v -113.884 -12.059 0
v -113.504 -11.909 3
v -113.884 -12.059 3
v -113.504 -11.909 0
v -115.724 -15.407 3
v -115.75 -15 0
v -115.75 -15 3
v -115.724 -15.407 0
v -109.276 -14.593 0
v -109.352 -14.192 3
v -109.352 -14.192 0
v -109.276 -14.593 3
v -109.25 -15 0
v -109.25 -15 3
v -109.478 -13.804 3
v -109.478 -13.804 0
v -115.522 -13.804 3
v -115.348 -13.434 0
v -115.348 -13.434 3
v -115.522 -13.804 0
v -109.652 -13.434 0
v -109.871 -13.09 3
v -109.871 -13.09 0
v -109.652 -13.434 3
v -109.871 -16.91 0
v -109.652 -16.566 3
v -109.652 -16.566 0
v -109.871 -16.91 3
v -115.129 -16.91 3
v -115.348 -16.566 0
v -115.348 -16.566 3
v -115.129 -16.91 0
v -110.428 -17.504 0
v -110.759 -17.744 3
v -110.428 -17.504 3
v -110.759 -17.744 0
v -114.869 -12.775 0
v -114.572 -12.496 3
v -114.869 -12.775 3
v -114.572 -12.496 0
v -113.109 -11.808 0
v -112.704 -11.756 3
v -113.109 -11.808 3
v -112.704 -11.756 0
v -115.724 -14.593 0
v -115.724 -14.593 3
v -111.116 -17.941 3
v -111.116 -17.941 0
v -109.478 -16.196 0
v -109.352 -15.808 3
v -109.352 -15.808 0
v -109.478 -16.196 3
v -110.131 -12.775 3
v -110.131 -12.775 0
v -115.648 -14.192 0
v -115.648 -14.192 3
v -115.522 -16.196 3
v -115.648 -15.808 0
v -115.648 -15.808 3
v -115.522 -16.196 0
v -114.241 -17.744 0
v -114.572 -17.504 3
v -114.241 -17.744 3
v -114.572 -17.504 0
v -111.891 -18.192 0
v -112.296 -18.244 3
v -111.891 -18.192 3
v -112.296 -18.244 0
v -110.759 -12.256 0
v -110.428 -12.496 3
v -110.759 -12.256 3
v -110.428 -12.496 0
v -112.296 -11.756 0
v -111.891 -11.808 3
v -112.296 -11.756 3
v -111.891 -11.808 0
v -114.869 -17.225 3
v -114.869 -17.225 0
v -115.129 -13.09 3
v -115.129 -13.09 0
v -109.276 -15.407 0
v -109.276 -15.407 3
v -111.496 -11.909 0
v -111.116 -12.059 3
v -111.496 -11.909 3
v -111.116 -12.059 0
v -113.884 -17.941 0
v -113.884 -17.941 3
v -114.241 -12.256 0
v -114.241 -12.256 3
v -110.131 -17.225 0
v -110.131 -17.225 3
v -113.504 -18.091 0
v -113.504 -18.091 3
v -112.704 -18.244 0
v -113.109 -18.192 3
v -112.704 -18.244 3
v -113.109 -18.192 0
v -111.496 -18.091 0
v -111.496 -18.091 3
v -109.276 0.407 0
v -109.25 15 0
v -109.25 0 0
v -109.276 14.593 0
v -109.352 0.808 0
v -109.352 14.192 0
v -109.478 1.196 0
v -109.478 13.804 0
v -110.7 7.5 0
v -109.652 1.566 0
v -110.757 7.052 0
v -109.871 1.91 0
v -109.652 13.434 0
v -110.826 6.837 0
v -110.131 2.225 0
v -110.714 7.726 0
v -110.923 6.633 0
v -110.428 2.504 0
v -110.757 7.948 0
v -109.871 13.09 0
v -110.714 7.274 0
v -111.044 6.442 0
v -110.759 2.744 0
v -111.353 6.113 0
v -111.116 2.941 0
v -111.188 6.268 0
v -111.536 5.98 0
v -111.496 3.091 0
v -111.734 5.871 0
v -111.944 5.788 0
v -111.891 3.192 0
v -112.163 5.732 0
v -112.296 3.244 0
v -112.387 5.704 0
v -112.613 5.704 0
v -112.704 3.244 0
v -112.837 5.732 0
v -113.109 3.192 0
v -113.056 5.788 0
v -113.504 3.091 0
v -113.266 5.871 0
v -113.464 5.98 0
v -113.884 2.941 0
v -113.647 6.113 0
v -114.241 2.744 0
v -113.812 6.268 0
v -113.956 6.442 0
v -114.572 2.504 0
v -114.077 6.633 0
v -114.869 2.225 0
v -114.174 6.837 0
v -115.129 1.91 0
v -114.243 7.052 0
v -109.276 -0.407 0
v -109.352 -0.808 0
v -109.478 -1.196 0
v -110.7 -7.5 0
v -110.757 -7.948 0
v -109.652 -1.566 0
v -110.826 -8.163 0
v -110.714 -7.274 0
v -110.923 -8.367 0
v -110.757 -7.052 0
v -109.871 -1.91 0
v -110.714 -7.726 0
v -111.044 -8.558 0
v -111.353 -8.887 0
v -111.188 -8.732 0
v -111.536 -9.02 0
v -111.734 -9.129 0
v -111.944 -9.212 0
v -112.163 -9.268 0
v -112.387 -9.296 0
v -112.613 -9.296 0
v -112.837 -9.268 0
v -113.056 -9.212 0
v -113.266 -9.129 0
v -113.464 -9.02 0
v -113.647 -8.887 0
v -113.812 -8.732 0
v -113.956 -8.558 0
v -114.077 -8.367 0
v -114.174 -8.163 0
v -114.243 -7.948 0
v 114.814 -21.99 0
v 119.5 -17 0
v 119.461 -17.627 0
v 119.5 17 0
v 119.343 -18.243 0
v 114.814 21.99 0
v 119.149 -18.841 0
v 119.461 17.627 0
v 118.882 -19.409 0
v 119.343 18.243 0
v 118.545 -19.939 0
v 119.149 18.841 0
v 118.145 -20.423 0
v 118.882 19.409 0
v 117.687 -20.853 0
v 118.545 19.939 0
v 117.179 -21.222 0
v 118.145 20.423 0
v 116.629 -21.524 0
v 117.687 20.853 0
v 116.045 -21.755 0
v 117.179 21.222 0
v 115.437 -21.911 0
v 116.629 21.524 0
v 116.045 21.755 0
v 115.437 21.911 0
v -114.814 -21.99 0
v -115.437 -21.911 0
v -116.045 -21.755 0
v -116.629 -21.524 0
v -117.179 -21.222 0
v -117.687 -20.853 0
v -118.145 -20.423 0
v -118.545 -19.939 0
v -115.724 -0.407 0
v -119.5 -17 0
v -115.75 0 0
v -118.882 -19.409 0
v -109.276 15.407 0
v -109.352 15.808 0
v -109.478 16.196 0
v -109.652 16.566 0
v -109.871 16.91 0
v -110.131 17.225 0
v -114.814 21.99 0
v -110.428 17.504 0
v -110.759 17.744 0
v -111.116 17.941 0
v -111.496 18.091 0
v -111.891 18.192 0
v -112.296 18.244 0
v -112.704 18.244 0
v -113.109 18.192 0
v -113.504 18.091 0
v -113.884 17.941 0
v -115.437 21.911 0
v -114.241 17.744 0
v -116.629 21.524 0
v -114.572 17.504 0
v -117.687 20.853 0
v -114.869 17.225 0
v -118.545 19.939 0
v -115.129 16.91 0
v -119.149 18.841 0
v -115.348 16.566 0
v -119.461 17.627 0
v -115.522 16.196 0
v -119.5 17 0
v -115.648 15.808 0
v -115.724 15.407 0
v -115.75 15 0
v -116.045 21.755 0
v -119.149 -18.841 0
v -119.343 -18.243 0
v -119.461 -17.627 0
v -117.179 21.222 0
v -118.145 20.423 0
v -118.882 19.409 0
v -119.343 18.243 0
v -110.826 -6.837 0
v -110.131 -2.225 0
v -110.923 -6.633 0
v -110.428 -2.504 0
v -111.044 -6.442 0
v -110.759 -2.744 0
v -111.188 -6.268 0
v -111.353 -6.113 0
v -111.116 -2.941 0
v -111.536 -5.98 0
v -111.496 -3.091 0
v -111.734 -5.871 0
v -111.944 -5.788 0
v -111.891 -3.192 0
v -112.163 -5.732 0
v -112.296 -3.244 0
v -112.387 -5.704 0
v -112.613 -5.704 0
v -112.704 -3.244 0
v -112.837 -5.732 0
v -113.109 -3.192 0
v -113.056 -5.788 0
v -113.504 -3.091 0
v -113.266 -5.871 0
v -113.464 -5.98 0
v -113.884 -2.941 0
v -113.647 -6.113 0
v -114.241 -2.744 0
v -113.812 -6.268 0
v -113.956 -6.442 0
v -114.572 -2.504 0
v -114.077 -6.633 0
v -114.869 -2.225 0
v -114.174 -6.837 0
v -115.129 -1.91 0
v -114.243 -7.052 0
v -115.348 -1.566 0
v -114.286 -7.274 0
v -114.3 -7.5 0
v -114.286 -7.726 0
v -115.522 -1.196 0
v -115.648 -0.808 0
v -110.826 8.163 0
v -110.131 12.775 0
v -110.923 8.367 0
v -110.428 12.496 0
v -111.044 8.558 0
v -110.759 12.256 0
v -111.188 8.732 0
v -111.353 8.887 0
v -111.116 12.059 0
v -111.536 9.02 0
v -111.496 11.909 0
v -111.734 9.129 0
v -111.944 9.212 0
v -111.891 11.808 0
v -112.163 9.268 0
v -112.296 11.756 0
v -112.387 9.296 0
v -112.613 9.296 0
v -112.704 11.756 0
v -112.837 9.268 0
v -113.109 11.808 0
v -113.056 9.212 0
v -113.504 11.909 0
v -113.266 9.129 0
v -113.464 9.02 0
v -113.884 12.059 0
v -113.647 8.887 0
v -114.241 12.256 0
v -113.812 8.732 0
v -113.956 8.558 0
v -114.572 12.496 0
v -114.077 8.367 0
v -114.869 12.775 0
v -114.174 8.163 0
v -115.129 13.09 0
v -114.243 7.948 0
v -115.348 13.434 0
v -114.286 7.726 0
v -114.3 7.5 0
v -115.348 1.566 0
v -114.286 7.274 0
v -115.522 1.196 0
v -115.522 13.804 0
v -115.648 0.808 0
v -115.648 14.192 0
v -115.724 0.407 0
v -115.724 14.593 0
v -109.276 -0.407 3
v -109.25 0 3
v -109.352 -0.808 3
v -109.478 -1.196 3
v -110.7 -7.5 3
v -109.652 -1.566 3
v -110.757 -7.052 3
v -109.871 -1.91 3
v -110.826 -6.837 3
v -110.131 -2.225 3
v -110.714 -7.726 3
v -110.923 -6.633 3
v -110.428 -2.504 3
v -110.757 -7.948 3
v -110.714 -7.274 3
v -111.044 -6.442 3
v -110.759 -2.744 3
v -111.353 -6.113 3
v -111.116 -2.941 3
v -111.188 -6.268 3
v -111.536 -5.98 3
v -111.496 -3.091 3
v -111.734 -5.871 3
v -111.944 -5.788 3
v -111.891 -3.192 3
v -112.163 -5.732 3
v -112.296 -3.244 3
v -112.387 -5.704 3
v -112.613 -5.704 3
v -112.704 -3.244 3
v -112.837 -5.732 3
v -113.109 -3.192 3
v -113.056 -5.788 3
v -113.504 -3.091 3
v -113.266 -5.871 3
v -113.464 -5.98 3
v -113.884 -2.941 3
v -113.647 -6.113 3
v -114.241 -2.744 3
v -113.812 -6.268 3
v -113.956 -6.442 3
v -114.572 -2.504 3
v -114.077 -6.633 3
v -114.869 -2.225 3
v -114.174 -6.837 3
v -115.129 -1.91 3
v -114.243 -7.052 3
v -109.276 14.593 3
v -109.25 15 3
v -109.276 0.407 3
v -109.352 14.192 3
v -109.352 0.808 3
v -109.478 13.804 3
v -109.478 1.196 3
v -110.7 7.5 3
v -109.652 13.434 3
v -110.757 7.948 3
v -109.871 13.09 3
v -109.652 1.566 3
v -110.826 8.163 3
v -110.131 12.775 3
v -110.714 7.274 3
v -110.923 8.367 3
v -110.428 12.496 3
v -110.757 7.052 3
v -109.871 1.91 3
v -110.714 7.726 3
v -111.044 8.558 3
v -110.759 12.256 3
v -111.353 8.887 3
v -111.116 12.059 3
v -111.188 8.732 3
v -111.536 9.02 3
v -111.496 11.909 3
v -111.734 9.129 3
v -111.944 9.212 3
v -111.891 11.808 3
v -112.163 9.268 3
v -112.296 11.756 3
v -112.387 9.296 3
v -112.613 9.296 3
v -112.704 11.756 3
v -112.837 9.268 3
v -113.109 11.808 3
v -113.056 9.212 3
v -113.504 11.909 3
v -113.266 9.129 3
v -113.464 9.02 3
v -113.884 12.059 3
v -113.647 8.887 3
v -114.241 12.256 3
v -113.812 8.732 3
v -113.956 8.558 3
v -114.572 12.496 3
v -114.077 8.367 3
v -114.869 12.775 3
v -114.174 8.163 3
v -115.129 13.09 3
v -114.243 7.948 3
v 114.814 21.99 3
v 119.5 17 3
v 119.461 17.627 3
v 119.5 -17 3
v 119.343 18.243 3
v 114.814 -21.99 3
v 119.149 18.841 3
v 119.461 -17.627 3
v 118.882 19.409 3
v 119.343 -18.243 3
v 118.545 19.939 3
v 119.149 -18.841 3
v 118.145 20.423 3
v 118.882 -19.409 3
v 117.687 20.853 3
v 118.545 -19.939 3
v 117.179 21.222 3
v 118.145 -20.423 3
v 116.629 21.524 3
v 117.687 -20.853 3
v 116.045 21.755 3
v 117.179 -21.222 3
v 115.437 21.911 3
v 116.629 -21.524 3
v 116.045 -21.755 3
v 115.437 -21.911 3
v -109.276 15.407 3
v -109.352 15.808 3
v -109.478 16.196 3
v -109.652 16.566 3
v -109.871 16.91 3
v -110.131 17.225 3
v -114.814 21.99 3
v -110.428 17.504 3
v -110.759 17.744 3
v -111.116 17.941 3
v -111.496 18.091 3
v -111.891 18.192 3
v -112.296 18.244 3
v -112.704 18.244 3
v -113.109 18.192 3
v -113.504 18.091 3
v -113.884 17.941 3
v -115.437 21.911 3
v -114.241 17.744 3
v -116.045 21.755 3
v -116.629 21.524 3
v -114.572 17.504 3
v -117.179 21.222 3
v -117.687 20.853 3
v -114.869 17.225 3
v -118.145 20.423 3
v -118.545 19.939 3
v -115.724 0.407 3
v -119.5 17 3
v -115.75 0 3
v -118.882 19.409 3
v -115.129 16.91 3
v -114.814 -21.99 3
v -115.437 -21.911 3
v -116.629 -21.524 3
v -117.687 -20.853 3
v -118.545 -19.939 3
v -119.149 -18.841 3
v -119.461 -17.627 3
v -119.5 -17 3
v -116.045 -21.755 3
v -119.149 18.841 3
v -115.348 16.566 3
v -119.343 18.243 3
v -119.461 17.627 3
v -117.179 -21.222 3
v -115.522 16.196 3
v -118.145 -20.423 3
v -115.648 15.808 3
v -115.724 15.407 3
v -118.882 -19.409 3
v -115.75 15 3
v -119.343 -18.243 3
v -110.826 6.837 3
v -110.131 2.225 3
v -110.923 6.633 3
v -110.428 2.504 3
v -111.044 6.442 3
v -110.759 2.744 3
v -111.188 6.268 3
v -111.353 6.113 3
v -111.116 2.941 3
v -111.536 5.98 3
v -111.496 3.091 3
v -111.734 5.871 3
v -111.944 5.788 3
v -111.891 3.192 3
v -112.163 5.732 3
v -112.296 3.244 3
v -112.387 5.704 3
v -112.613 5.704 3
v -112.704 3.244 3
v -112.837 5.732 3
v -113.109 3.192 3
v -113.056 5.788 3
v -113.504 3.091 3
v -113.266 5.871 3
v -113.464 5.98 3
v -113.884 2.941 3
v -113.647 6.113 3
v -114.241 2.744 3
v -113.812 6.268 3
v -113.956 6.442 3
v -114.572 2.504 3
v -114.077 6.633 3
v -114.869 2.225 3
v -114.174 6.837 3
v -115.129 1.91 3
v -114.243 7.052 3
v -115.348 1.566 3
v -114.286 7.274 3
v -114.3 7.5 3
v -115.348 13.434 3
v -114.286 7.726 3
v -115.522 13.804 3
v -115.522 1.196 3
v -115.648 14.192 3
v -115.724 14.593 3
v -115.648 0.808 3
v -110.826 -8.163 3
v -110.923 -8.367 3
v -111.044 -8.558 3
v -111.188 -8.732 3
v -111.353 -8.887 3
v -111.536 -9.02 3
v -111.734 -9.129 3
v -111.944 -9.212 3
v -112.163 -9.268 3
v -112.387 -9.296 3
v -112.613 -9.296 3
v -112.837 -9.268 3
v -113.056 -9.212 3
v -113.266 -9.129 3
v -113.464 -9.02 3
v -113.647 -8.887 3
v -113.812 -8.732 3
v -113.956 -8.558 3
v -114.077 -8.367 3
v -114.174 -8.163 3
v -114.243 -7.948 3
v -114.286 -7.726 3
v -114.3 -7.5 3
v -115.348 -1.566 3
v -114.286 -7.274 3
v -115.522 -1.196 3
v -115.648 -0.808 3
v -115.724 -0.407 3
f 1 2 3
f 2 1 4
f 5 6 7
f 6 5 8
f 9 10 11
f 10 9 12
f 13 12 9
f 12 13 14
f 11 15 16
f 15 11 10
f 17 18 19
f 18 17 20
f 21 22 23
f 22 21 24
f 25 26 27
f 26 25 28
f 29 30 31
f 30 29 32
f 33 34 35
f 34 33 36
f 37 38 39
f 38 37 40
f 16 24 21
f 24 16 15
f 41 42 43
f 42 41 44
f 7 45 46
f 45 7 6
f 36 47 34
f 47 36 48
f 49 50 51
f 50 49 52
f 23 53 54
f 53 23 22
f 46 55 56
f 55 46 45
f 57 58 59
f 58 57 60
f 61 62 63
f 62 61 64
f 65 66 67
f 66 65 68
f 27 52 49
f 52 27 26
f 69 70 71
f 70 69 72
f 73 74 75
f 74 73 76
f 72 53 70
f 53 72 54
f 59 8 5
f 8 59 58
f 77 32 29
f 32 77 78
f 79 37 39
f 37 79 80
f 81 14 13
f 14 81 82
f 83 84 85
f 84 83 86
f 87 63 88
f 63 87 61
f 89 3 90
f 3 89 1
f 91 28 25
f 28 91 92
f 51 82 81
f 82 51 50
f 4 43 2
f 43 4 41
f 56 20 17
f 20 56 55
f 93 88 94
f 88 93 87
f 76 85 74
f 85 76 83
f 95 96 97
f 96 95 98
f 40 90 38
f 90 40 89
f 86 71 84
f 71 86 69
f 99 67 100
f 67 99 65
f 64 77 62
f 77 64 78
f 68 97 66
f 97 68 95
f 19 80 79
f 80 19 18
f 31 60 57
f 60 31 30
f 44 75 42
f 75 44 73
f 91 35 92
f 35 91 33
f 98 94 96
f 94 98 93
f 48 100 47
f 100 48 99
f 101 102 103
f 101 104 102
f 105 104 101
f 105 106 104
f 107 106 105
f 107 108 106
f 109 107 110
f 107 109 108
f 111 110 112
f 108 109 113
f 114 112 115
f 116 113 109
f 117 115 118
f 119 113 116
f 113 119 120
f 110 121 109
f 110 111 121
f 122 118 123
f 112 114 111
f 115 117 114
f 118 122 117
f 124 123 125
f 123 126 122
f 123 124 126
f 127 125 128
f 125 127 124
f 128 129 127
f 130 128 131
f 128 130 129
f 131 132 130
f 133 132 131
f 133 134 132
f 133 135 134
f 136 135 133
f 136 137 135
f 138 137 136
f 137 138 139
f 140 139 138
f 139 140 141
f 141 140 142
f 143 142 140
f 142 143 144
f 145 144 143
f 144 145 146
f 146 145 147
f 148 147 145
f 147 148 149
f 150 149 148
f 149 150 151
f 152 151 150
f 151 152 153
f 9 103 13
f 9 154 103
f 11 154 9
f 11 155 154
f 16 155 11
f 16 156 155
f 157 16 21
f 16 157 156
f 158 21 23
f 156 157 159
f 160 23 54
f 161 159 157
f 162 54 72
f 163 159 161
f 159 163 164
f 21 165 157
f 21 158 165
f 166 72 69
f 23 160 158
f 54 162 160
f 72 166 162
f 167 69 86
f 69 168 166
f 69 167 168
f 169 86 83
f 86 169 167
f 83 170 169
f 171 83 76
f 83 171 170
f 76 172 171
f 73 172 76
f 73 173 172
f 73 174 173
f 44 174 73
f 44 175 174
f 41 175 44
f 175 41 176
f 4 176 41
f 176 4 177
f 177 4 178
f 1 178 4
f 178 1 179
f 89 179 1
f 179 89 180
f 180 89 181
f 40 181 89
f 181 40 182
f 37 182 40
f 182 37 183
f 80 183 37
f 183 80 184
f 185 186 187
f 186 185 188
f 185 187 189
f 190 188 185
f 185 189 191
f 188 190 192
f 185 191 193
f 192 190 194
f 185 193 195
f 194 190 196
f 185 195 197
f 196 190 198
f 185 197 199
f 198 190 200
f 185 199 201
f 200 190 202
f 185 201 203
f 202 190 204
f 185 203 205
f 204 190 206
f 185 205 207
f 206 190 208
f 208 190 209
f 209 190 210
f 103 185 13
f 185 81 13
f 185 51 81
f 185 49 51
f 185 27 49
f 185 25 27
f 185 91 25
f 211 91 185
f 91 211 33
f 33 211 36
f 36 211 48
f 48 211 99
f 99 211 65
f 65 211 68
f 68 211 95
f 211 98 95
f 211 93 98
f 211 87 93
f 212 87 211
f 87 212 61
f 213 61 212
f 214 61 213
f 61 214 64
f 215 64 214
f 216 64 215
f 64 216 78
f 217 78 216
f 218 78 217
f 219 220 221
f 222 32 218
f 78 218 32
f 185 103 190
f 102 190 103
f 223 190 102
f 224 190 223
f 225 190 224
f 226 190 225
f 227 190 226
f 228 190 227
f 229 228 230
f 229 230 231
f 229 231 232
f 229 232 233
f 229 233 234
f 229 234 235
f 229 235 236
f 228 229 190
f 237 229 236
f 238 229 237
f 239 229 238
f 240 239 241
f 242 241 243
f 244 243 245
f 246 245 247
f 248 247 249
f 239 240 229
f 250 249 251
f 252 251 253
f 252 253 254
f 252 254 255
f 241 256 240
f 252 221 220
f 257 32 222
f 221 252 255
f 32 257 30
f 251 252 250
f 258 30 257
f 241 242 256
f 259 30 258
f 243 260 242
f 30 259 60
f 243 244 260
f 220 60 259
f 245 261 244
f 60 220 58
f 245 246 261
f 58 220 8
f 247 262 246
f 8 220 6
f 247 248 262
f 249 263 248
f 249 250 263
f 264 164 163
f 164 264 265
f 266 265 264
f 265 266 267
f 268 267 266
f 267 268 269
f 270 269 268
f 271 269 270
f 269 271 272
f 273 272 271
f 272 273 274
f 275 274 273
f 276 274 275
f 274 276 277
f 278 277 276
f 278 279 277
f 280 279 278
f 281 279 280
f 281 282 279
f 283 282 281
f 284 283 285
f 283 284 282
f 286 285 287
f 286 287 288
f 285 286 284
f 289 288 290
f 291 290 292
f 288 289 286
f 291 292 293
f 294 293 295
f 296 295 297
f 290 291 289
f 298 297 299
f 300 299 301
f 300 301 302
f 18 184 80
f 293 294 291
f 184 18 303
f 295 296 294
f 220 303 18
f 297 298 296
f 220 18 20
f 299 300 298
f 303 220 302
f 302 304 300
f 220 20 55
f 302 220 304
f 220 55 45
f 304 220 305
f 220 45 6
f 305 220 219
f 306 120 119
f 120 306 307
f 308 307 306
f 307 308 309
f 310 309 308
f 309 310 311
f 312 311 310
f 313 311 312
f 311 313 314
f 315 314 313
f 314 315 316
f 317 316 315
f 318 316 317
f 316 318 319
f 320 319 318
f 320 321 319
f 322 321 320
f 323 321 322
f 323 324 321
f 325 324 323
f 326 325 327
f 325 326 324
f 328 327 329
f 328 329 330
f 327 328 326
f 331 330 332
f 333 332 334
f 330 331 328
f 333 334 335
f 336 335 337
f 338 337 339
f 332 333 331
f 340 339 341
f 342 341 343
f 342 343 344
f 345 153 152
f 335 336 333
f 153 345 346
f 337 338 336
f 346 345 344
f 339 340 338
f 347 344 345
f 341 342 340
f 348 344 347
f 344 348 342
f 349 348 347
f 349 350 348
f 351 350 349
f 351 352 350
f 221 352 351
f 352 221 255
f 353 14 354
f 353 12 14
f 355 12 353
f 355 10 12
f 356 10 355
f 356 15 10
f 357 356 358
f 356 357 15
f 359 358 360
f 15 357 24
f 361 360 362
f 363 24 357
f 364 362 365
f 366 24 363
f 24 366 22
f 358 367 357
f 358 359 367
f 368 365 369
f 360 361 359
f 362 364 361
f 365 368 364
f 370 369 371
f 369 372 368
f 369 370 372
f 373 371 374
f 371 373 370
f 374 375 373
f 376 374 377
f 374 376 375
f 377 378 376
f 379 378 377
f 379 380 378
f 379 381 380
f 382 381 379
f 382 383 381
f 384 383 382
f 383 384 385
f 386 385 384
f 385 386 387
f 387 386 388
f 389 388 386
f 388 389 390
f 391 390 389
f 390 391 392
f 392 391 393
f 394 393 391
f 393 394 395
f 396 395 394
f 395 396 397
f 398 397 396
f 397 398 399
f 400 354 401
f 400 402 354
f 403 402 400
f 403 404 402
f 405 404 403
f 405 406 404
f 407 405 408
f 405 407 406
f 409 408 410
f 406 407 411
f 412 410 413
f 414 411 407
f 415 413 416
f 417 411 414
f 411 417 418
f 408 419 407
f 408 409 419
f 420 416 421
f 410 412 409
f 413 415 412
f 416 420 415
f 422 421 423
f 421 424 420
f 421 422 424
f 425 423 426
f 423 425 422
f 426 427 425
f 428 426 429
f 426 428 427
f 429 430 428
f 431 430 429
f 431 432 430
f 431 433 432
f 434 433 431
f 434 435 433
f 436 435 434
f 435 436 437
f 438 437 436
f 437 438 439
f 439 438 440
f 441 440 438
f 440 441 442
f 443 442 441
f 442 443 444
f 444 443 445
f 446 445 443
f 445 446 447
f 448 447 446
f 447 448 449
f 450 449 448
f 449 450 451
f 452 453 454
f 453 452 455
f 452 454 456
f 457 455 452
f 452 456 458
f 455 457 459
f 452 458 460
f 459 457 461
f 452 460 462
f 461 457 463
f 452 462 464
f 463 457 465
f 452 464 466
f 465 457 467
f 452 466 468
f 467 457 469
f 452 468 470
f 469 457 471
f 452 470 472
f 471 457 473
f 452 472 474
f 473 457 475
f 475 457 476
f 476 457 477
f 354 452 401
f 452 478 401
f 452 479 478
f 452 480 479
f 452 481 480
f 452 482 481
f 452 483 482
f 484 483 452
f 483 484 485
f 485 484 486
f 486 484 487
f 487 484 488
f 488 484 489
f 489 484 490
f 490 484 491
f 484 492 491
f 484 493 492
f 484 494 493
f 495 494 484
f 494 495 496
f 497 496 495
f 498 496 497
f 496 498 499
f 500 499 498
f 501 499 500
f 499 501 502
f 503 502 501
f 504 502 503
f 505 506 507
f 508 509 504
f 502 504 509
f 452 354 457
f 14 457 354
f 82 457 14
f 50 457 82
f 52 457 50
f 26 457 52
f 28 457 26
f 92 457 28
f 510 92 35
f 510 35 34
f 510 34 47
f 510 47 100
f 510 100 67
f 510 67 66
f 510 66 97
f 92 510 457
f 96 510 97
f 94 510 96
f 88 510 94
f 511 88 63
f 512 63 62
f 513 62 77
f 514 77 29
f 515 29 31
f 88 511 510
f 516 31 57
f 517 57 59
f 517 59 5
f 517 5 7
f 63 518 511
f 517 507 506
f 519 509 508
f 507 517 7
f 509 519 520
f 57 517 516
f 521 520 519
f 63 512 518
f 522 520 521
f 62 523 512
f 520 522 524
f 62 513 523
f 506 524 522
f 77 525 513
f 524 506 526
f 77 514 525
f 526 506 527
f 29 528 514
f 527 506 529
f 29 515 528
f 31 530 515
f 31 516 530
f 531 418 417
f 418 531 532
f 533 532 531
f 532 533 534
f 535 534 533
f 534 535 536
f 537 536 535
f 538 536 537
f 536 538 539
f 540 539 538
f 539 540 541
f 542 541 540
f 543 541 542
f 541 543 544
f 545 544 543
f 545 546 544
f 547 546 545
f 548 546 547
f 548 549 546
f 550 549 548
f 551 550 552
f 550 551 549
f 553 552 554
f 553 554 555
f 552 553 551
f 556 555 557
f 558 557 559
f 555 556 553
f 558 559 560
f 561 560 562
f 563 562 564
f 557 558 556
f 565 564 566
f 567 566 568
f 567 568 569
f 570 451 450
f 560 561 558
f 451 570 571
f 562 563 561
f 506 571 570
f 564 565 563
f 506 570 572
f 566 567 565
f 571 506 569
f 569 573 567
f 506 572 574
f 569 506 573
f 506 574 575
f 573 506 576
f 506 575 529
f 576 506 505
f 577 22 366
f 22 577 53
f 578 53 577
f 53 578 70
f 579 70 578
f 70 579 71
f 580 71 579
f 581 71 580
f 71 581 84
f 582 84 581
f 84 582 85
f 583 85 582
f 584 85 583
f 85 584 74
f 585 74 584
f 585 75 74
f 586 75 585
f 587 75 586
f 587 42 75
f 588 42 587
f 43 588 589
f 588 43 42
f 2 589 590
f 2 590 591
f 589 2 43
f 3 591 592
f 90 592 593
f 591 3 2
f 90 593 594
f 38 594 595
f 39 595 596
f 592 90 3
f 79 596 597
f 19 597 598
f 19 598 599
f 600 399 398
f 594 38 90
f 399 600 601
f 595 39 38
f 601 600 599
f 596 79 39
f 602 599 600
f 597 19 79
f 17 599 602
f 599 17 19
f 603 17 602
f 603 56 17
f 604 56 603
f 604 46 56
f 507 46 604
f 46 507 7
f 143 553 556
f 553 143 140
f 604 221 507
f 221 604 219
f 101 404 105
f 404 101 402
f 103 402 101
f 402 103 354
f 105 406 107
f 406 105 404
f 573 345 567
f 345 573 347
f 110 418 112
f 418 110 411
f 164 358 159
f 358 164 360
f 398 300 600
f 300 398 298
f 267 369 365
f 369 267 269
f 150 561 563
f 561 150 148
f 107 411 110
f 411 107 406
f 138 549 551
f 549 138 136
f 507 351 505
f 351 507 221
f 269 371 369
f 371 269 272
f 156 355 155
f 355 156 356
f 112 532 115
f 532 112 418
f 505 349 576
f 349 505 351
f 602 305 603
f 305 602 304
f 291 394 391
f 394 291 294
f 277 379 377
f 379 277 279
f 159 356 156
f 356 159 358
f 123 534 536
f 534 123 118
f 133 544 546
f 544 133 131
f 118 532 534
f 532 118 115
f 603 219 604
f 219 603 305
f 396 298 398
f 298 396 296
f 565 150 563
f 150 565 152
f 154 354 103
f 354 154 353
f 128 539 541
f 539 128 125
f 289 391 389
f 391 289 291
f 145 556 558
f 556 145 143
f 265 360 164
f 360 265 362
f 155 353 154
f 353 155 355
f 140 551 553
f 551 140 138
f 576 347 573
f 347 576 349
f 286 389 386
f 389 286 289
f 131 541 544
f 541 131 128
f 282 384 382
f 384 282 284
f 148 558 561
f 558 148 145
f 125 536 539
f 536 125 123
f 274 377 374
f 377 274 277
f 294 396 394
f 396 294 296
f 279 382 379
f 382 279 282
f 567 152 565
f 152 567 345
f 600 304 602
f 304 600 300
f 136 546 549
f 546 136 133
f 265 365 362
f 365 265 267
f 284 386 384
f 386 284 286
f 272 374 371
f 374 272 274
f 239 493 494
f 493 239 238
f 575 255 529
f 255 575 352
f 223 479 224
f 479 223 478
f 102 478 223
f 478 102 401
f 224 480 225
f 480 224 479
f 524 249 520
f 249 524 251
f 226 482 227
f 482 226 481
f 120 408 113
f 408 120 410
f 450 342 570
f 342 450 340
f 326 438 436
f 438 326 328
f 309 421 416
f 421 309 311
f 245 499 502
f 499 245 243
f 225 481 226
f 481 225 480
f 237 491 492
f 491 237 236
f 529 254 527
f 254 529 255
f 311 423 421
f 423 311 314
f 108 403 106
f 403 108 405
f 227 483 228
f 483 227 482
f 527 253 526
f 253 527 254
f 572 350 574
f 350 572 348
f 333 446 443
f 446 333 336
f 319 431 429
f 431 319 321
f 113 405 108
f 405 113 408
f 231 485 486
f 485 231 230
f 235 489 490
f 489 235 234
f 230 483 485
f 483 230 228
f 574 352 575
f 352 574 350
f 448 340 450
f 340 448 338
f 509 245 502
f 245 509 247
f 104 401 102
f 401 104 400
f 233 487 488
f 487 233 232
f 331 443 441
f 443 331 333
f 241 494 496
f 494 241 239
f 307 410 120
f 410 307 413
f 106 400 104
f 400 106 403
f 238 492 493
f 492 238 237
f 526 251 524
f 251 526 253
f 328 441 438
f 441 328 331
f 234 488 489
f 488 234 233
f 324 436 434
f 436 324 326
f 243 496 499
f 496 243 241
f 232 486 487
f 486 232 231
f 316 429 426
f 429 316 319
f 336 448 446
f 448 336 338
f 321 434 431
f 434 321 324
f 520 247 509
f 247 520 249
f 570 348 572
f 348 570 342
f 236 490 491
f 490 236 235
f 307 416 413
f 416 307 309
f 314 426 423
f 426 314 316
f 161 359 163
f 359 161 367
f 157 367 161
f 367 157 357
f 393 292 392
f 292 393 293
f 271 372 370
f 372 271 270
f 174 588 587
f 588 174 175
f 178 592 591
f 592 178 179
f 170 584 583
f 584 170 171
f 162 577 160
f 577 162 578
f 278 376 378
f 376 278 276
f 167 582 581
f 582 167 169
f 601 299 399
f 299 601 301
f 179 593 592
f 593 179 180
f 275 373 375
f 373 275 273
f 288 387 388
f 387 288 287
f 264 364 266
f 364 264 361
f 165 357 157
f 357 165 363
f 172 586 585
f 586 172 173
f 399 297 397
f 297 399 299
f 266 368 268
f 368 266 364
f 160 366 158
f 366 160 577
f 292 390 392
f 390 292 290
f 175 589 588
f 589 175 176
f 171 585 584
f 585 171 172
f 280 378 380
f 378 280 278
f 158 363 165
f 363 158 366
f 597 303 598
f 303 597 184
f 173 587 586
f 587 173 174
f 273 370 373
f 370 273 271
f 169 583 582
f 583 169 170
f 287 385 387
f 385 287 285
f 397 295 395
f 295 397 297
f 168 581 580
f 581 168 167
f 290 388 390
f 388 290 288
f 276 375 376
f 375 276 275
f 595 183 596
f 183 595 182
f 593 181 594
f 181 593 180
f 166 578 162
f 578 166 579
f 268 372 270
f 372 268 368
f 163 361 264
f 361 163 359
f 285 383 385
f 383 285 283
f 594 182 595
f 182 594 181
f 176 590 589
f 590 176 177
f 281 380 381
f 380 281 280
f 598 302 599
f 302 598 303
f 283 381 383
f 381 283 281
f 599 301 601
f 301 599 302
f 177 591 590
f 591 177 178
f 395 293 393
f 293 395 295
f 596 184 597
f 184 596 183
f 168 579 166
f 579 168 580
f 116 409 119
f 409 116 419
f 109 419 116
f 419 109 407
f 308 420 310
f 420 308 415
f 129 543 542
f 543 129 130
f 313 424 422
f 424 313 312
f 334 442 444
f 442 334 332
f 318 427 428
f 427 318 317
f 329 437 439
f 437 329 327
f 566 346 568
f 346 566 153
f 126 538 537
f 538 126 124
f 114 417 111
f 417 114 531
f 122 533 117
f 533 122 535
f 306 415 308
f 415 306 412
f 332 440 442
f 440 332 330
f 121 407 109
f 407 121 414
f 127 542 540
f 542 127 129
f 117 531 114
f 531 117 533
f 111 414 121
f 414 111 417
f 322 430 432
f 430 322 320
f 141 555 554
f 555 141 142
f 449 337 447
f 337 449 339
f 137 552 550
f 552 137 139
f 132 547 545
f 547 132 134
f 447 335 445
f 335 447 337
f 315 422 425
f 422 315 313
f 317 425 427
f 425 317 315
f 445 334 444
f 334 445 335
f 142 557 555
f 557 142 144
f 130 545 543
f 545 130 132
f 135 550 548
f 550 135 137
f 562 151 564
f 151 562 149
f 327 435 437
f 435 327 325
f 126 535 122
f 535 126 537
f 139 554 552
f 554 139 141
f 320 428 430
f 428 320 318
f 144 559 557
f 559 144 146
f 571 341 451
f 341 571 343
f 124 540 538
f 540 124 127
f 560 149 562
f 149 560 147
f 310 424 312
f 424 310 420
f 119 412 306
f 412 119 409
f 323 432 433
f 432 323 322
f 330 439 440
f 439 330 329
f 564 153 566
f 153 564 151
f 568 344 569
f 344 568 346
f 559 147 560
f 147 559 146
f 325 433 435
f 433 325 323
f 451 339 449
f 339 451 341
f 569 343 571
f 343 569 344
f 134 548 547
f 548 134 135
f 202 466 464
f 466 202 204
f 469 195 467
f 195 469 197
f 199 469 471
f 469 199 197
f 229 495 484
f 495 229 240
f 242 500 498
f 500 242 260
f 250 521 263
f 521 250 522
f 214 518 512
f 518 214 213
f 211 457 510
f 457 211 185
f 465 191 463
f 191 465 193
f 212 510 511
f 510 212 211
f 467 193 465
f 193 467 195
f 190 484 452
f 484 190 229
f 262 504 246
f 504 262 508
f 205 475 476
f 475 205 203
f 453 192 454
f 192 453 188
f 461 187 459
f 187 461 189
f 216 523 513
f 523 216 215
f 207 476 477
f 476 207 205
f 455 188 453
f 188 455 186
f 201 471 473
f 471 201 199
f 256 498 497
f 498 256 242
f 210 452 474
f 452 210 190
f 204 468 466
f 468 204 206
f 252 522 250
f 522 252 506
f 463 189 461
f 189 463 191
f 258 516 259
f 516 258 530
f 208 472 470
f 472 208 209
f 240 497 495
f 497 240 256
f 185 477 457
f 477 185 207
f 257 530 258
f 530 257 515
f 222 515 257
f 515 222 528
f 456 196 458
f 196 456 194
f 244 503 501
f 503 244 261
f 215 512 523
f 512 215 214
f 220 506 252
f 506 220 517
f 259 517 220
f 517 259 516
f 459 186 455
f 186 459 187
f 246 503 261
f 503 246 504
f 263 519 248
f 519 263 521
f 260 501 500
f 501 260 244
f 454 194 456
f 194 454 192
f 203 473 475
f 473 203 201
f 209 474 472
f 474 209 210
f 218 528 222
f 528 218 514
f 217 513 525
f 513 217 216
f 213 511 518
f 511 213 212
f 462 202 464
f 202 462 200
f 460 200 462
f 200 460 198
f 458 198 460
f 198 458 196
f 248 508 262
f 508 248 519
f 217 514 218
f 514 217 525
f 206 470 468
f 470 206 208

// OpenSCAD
$fn = 50;


difference() {
	union() {
		hull() {
			translate(v = [-114.5000000000, 17.0000000000, 0]) {
				cylinder(h = 3, r = 5);
			}
			translate(v = [114.5000000000, 17.0000000000, 0]) {
				cylinder(h = 3, r = 5);
			}
			translate(v = [-114.5000000000, -17.0000000000, 0]) {
				cylinder(h = 3, r = 5);
			}
			translate(v = [114.5000000000, -17.0000000000, 0]) {
				cylinder(h = 3, r = 5);
			}
		}
	}
	union() {
		translate(v = [-112.5000000000, -15.0000000000, 0]) {
			cylinder(h = 3, r = 3.2500000000);
		}
		translate(v = [-112.5000000000, 0.0000000000, 0]) {
			cylinder(h = 3, r = 3.2500000000);
		}
		translate(v = [-112.5000000000, 15.0000000000, 0]) {
			cylinder(h = 3, r = 3.2500000000);
		}
		translate(v = [-112.5000000000, -15.0000000000, 0]) {
			cylinder(h = 3, r = 1.8000000000);
		}
		translate(v = [-112.5000000000, -7.5000000000, 0]) {
			cylinder(h = 3, r = 1.8000000000);
		}
		translate(v = [-112.5000000000, 0.0000000000, 0]) {
			cylinder(h = 3, r = 1.8000000000);
		}
		translate(v = [-112.5000000000, 7.5000000000, 0]) {
			cylinder(h = 3, r = 1.8000000000);
		}
		translate(v = [-112.5000000000, 15.0000000000, 0]) {
			cylinder(h = 3, r = 1.8000000000);
		}
		translate(v = [-112.5000000000, -15.0000000000, 0]) {
			cylinder(h = 3, r = 1.8000000000);
		}
		translate(v = [-112.5000000000, -7.5000000000, 0]) {
			cylinder(h = 3, r = 1.8000000000);
		}
		translate(v = [-112.5000000000, 0.0000000000, 0]) {
			cylinder(h = 3, r = 1.8000000000);
		}
		translate(v = [-112.5000000000, 7.5000000000, 0]) {
			cylinder(h = 3, r = 1.8000000000);
		}
		translate(v = [-112.5000000000, 15.0000000000, 0]) {
			cylinder(h = 3, r = 1.8000000000);
		}
		translate(v = [-112.5000000000, -15.0000000000, 0]) {
			cylinder(h = 3, r = 1.8000000000);
		}
		translate(v = [-112.5000000000, -7.5000000000, 0]) {
			cylinder(h = 3, r = 1.8000000000);
		}
		translate(v = [-112.5000000000, 0.0000000000, 0]) {
			cylinder(h = 3, r = 1.8000000000);
		}
		translate(v = [-112.5000000000, 7.5000000000, 0]) {
			cylinder(h = 3, r = 1.8000000000);
		}
		translate(v = [-112.5000000000, 15.0000000000, 0]) {
			cylinder(h = 3, r = 1.8000000000);
		}
	}
}
